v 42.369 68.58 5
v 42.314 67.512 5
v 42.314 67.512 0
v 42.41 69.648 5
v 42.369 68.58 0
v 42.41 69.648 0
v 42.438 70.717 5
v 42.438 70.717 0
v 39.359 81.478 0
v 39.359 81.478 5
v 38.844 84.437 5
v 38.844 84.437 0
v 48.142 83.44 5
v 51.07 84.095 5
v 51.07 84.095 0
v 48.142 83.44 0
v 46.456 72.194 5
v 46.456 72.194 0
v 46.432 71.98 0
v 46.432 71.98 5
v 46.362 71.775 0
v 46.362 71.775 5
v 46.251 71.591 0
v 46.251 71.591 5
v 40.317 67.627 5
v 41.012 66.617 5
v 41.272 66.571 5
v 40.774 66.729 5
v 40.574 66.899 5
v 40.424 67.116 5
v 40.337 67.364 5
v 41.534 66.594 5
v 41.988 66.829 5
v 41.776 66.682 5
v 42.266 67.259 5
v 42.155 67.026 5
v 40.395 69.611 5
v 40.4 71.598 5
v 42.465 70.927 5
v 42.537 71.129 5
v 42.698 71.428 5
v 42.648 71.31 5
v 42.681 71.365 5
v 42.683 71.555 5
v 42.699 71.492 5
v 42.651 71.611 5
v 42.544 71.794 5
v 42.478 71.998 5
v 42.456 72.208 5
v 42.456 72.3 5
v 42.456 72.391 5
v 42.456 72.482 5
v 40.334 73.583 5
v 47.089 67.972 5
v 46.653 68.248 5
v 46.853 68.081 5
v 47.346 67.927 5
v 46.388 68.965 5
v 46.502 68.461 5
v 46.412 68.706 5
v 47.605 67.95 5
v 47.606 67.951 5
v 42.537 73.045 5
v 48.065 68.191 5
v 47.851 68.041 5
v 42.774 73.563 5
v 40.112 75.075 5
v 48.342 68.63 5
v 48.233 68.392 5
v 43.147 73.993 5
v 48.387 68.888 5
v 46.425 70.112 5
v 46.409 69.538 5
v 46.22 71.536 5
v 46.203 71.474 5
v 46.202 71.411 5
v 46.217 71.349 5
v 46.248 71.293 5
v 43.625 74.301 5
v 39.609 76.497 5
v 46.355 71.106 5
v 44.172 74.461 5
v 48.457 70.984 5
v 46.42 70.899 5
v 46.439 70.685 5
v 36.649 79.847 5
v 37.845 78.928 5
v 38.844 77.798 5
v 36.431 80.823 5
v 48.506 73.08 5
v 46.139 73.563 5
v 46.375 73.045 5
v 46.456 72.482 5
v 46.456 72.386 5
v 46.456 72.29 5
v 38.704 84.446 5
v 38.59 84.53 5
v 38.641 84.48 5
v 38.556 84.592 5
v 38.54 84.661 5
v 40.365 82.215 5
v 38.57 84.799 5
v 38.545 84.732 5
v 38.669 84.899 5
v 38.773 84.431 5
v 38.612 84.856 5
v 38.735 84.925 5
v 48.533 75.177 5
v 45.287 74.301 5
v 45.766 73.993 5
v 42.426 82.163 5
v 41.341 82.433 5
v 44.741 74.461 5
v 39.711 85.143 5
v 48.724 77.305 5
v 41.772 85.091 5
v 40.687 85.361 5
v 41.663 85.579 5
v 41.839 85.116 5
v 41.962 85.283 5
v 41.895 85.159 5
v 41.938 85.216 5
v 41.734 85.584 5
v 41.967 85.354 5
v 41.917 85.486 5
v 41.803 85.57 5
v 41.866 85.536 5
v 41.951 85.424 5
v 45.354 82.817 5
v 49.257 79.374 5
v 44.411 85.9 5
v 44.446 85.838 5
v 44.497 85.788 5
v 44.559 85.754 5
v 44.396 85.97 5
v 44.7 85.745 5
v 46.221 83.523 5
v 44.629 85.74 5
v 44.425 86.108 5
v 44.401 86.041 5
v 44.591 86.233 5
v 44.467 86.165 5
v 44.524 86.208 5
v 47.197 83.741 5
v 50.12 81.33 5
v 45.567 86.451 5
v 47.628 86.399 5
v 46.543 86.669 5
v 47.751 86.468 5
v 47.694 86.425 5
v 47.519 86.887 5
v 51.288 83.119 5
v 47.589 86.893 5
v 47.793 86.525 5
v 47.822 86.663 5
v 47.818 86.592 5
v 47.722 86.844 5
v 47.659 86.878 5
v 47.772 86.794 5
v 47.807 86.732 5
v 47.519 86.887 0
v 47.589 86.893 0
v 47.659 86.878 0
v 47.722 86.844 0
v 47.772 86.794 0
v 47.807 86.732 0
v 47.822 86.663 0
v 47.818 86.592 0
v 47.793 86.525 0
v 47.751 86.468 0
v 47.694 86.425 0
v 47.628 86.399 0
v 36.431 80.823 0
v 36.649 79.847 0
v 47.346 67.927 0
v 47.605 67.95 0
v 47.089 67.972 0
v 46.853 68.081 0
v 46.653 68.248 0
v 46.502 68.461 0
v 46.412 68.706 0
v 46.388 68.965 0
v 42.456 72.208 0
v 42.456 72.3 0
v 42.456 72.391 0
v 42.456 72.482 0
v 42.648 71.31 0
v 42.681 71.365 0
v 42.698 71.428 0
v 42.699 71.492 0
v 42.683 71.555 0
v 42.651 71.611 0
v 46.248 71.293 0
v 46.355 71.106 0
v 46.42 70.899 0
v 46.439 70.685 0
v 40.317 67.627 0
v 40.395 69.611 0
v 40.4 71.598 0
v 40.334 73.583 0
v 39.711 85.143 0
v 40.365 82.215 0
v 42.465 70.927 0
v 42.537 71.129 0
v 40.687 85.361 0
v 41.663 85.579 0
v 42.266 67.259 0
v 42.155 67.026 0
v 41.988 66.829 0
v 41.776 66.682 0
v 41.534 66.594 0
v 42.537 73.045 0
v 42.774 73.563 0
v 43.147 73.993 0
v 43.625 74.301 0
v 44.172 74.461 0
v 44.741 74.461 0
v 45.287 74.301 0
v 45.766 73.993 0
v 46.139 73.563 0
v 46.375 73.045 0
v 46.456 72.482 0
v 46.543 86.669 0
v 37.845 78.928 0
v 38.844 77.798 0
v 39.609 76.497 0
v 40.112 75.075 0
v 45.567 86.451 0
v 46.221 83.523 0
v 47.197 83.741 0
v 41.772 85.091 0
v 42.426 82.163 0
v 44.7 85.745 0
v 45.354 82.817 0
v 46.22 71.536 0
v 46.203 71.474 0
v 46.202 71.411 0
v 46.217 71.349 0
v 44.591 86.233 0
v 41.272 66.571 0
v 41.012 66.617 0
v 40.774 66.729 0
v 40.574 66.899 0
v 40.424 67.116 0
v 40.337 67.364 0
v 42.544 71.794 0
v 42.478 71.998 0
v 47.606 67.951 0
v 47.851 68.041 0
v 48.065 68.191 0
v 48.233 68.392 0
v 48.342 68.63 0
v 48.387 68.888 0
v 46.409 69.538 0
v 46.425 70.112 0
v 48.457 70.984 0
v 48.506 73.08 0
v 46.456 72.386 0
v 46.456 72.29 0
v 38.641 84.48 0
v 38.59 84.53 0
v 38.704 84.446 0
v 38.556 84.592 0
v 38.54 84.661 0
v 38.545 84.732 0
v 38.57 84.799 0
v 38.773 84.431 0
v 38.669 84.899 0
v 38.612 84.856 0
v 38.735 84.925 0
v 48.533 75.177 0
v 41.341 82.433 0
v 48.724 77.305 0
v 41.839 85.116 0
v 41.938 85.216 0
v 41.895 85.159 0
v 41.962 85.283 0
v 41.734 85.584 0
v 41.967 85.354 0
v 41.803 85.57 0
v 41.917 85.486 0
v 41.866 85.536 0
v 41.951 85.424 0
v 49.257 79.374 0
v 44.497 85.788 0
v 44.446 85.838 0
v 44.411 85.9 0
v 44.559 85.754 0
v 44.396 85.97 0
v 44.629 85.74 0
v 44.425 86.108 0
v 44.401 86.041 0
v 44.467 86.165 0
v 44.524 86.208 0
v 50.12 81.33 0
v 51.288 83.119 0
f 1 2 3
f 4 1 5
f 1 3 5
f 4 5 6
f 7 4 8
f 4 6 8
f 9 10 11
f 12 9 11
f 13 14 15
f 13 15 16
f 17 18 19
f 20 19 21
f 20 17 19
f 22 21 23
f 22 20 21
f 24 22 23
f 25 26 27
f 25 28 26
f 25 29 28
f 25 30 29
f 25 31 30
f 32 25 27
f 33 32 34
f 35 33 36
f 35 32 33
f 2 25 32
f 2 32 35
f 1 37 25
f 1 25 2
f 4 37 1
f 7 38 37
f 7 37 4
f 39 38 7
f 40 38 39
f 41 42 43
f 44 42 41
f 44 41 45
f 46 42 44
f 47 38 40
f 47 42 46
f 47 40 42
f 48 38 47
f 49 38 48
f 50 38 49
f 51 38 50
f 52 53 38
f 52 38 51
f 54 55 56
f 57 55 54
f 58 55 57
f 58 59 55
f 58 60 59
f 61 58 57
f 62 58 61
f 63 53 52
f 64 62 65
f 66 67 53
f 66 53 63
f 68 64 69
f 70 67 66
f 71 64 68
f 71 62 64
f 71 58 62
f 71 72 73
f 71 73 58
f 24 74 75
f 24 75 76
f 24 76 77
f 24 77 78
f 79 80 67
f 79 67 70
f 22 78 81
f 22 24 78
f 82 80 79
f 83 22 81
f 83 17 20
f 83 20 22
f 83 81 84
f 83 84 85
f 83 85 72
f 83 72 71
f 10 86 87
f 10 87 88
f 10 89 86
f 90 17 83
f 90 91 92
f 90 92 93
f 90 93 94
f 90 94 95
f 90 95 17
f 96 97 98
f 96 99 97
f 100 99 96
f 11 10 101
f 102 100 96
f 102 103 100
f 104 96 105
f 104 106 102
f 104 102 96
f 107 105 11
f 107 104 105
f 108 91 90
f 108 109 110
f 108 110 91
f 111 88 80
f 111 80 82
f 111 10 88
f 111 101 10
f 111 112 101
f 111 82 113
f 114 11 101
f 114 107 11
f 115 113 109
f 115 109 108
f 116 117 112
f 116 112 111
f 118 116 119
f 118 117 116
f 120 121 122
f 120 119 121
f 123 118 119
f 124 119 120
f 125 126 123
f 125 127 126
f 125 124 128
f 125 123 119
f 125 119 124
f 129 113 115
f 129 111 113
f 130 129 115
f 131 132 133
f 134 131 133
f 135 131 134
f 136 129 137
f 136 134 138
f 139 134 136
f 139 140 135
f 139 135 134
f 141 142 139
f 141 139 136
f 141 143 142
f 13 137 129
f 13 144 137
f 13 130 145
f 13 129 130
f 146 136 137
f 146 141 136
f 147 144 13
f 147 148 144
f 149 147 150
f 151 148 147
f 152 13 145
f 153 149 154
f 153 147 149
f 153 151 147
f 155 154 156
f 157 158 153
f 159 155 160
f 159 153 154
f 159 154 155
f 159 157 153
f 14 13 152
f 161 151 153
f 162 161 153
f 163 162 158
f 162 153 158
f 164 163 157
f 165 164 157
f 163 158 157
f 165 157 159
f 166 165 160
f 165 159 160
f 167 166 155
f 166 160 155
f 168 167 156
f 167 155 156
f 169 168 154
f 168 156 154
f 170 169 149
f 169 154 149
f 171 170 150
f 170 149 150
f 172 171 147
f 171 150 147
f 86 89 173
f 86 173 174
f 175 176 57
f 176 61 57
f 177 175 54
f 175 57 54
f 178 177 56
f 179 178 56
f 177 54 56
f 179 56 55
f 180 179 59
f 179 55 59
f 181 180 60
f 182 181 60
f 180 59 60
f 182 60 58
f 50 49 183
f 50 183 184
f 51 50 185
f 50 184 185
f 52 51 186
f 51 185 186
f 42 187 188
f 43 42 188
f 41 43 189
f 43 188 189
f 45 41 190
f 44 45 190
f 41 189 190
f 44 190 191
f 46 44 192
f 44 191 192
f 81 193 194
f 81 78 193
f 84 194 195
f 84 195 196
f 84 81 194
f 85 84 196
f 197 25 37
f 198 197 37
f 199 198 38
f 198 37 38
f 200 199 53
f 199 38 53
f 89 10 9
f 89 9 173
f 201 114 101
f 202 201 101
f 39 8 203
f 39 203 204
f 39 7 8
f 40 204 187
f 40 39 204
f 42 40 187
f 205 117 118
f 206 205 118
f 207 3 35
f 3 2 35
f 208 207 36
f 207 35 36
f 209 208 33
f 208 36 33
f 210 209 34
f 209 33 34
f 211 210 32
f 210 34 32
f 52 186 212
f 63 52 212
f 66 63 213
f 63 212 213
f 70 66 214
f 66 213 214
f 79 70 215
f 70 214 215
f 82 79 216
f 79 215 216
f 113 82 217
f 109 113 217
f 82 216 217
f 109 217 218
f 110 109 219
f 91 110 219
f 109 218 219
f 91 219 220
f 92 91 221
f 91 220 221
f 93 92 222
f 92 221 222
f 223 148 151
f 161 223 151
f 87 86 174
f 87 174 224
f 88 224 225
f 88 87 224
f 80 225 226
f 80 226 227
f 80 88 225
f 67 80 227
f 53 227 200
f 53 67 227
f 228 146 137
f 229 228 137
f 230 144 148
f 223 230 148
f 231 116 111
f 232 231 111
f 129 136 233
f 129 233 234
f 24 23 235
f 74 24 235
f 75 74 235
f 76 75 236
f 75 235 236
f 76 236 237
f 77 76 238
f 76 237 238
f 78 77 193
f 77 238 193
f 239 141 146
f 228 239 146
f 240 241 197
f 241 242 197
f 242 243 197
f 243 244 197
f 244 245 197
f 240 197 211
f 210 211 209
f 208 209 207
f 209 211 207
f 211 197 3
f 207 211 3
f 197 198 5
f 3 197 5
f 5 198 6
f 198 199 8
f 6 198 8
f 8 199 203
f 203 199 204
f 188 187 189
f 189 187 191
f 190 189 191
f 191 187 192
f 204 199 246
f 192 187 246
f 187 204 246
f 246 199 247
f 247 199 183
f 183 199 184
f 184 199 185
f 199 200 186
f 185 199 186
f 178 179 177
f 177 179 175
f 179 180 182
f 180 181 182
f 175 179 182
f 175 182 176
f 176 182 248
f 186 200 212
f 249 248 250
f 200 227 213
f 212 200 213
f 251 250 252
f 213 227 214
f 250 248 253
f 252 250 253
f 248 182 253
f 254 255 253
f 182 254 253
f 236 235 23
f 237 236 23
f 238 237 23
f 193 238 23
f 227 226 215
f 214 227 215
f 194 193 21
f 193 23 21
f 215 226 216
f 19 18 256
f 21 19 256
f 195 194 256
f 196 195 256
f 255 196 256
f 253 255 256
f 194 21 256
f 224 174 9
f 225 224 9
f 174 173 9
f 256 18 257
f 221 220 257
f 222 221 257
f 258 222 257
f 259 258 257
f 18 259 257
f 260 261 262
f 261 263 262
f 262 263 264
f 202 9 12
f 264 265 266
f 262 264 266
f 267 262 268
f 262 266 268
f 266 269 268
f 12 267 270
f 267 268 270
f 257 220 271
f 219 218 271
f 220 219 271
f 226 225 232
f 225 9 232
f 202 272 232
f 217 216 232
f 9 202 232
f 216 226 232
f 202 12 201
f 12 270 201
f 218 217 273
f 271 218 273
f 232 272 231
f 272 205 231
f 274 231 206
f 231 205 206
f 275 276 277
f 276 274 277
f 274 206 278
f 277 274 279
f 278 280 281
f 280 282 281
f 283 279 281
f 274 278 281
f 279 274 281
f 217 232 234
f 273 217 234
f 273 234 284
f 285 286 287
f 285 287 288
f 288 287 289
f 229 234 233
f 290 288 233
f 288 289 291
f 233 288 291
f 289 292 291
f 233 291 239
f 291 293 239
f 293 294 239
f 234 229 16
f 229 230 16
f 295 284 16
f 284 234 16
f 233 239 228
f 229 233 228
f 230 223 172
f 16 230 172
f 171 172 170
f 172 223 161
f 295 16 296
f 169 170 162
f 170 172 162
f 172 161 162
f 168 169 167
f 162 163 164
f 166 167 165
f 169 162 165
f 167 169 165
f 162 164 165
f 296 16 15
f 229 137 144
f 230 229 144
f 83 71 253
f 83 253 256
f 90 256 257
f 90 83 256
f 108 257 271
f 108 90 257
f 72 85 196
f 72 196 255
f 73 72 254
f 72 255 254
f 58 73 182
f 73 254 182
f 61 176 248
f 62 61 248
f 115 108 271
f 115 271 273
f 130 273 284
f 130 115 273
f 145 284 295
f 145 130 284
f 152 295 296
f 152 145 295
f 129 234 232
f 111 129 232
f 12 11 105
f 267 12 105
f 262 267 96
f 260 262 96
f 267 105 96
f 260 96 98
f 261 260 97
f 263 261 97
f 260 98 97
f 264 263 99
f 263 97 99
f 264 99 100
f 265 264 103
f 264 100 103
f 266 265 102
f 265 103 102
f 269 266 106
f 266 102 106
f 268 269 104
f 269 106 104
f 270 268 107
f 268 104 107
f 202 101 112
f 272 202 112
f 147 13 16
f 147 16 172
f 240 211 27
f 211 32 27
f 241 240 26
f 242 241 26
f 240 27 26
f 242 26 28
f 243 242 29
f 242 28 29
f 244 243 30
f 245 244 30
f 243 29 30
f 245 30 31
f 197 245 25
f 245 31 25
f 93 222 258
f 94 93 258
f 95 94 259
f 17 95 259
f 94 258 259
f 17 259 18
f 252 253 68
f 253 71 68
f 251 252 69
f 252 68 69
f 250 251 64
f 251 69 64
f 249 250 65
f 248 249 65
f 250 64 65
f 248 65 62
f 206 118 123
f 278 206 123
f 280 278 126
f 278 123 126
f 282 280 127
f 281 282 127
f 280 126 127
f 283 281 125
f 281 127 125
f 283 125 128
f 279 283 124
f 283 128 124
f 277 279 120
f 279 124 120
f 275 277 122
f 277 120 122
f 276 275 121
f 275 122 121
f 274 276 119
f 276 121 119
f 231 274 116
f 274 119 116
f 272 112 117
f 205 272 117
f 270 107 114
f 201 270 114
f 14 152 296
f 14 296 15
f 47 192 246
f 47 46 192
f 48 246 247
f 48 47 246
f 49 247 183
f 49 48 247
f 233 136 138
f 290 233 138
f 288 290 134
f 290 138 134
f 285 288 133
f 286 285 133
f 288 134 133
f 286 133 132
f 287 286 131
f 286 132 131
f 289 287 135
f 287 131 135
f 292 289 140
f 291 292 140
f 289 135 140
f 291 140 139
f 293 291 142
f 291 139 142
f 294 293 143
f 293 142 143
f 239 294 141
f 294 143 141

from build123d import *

# Parameters (mm, degrees)
BOSS_EXTRUDE1_DEPTH = 5
FILLET1_R           = 1
FILLET2_R           = 1
BOSS_EXTRUDE2_DEPTH = 5
BOSS_EXTRUDE3_DEPTH = 5
CUT_EXTRUDE1_DEPTH  = 5
BOSS_EXTRUDE4_DEPTH = 5


with BuildPart() as part:
    # Sketch1 → Boss-Extrude1 (new body)
    with BuildSketch(Plane.XY):
        with BuildLine():
            Line((46.328585563, 67.665133516), (48.353724123, 68.117689166))
            ThreePointArc((48.353724123, 68.117689166), (48.398647133, 75.753686317), (47.81637492, 83.367583456))
            Line((47.81637492, 83.367583456), (39.963901457, 81.612799216))
            ThreePointArc((39.963901457, 81.612799216), (40.443341541, 73.963706944), (40.231134371, 66.302542314))
            Line((40.231134371, 66.302542314), (42.267565607, 66.757621526))
            ThreePointArc((42.267565607, 66.757621526), (42.38586051, 68.984034012), (42.447007404, 71.212748282))
            ThreePointArc((42.447007404, 71.212748282), (42.700281141, 71.459795226), (42.452870187, 71.712713391))
            ThreePointArc((42.452870187, 71.712713391), (42.455422518, 72.097266143), (42.4562733, 72.481826424))
            ThreePointArc((42.4562733, 72.481826424), (44.4562733, 74.481826424), (46.4562733, 72.481826424))
            ThreePointArc((46.4562733, 72.481826424), (46.455410169, 72.085672321), (46.452820794, 71.68952574))
            ThreePointArc((46.452820794, 71.68952574), (46.200314758, 71.442404649), (46.447088433, 71.189559074))
            ThreePointArc((46.447088433, 71.189559074), (46.404927274, 69.426771663), (46.328585563, 67.665133516))
        make_face()
    extrude(amount=BOSS_EXTRUDE1_DEPTH)

    # Fillet1
    fillet1_edges = [part.edges().sort_by_distance(p)[0] for p in [
        (46.447088433, 71.189559074, 2.5),
        (46.452820794, 71.68952574, 2.5),
        (42.452870187, 71.712713391, 2.5),
        (42.447007404, 71.212748282, 2.5),
    ]]
    fillet(fillet1_edges, radius=FILLET1_R)

    # Fillet2
    fillet2_edges = [part.edges().sort_by_distance(p)[0] for p in [
        (48.353724123, 68.117689166, 2.5),
        (46.328585563, 67.665133516, 2.5),
        (42.267565607, 66.757621526, 2.5),
        (40.231134371, 66.302542314, 2.5),
    ]]
    fillet(fillet2_edges, radius=FILLET2_R - 0.0001)  # a hair under: the kernel refuses the full size

    # Sketch2 → Boss-Extrude2 (add)
    with BuildSketch(Plane.XY.offset(5)):
        with BuildLine():
            Line((39.70200957, 79.50494448), (38.844189625, 84.436573388))
            Line((38.844189625, 84.436573388), (41.771975747, 85.090842768))
            Line((41.771975747, 85.090842768), (42.426245127, 82.163056646))
            Line((42.426245127, 82.163056646), (40.317359796, 67.626756722))
            ThreePointArc((40.317359796, 67.626756722), (40.333588714, 73.582630469), (39.70200957, 79.50494448))
        make_face()
        with BuildLine():
            Line((48.485367937, 81.467752621), (47.627547992, 86.399381529))
            Line((47.627547992, 86.399381529), (44.699761869, 85.745112148))
            Line((44.699761869, 85.745112148), (45.35403125, 82.817326026))
            Line((45.35403125, 82.817326026), (48.38673347, 68.887746621))
            ThreePointArc((48.38673347, 68.887746621), (48.533086838, 75.176988802), (48.485367937, 81.467752621))
        make_face()
    extrude(amount=-BOSS_EXTRUDE2_DEPTH)

    # Sketch3 → Boss-Extrude3 (add)
    with BuildSketch(Plane.XY.offset(5)):
        with BuildLine():
            ThreePointArc((41.66293085, 85.578807122), (41.961435476, 85.389347393), (41.771975747, 85.090842768))
            Line((41.771975747, 85.090842768), (38.844189625, 84.436573388))
            ThreePointArc((38.844189625, 84.436573388), (38.545685, 84.626033116), (38.735144728, 84.924537741))
            Line((38.735144728, 84.924537741), (41.66293085, 85.578807122))
        make_face()
        with BuildLine():
            ThreePointArc((47.518503095, 86.887345882), (47.81700772, 86.697886154), (47.627547992, 86.399381529))
            Line((47.627547992, 86.399381529), (44.699761869, 85.745112148))
            ThreePointArc((44.699761869, 85.745112148), (44.401257244, 85.934571877), (44.590716973, 86.233076502))
            Line((44.590716973, 86.233076502), (47.518503095, 86.887345882))
        make_face()
    extrude(amount=-BOSS_EXTRUDE3_DEPTH)

    # Sketch4 → Cut-Extrude1 (cut)
    with BuildSketch(Plane.XY.offset(5)):
        Polygon((39.711073435, 85.142627535), (40.365342816, 82.214841413), (41.341271523, 82.432931206), (40.687002143, 85.360717328), align=None)
        Polygon((46.542574388, 86.669256089), (45.56664568, 86.451166295), (46.22091506, 83.523380173), (47.196843768, 83.741469966), align=None)
    extrude(amount=-CUT_EXTRUDE1_DEPTH, mode=Mode.SUBTRACT)

    # Sketch5 → Boss-Extrude4 (add)
    with BuildSketch(Plane.XY.offset(5)):
        with BuildLine():
            Line((39.358881592, 81.477596043), (36.43109547, 80.823326663))
            Line((36.43109547, 80.823326663), (36.649185263, 79.847397955))
            ThreePointArc((36.649185263, 79.847397955), (39.257727558, 77.165710562), (40.333588714, 73.582630469))
            Line((40.333588714, 73.582630469), (44.031942568, 76.908555657))
            Line((44.031942568, 76.908555657), (48.533086838, 75.176988802))
            ThreePointArc((48.533086838, 75.176988802), (49.257403766, 79.374463858), (51.288115875, 83.118744857))
            Line((51.288115875, 83.118744857), (51.070026081, 84.094673564))
            Line((51.070026081, 84.094673564), (48.142239959, 83.440404184))
            Line((48.142239959, 83.440404184), (46.362753702, 81.840114326))
            Line((46.362753702, 81.840114326), (39.358881592, 81.477596043))
        make_face()
    extrude(amount=-BOSS_EXTRUDE4_DEPTH)


solid = part.part
